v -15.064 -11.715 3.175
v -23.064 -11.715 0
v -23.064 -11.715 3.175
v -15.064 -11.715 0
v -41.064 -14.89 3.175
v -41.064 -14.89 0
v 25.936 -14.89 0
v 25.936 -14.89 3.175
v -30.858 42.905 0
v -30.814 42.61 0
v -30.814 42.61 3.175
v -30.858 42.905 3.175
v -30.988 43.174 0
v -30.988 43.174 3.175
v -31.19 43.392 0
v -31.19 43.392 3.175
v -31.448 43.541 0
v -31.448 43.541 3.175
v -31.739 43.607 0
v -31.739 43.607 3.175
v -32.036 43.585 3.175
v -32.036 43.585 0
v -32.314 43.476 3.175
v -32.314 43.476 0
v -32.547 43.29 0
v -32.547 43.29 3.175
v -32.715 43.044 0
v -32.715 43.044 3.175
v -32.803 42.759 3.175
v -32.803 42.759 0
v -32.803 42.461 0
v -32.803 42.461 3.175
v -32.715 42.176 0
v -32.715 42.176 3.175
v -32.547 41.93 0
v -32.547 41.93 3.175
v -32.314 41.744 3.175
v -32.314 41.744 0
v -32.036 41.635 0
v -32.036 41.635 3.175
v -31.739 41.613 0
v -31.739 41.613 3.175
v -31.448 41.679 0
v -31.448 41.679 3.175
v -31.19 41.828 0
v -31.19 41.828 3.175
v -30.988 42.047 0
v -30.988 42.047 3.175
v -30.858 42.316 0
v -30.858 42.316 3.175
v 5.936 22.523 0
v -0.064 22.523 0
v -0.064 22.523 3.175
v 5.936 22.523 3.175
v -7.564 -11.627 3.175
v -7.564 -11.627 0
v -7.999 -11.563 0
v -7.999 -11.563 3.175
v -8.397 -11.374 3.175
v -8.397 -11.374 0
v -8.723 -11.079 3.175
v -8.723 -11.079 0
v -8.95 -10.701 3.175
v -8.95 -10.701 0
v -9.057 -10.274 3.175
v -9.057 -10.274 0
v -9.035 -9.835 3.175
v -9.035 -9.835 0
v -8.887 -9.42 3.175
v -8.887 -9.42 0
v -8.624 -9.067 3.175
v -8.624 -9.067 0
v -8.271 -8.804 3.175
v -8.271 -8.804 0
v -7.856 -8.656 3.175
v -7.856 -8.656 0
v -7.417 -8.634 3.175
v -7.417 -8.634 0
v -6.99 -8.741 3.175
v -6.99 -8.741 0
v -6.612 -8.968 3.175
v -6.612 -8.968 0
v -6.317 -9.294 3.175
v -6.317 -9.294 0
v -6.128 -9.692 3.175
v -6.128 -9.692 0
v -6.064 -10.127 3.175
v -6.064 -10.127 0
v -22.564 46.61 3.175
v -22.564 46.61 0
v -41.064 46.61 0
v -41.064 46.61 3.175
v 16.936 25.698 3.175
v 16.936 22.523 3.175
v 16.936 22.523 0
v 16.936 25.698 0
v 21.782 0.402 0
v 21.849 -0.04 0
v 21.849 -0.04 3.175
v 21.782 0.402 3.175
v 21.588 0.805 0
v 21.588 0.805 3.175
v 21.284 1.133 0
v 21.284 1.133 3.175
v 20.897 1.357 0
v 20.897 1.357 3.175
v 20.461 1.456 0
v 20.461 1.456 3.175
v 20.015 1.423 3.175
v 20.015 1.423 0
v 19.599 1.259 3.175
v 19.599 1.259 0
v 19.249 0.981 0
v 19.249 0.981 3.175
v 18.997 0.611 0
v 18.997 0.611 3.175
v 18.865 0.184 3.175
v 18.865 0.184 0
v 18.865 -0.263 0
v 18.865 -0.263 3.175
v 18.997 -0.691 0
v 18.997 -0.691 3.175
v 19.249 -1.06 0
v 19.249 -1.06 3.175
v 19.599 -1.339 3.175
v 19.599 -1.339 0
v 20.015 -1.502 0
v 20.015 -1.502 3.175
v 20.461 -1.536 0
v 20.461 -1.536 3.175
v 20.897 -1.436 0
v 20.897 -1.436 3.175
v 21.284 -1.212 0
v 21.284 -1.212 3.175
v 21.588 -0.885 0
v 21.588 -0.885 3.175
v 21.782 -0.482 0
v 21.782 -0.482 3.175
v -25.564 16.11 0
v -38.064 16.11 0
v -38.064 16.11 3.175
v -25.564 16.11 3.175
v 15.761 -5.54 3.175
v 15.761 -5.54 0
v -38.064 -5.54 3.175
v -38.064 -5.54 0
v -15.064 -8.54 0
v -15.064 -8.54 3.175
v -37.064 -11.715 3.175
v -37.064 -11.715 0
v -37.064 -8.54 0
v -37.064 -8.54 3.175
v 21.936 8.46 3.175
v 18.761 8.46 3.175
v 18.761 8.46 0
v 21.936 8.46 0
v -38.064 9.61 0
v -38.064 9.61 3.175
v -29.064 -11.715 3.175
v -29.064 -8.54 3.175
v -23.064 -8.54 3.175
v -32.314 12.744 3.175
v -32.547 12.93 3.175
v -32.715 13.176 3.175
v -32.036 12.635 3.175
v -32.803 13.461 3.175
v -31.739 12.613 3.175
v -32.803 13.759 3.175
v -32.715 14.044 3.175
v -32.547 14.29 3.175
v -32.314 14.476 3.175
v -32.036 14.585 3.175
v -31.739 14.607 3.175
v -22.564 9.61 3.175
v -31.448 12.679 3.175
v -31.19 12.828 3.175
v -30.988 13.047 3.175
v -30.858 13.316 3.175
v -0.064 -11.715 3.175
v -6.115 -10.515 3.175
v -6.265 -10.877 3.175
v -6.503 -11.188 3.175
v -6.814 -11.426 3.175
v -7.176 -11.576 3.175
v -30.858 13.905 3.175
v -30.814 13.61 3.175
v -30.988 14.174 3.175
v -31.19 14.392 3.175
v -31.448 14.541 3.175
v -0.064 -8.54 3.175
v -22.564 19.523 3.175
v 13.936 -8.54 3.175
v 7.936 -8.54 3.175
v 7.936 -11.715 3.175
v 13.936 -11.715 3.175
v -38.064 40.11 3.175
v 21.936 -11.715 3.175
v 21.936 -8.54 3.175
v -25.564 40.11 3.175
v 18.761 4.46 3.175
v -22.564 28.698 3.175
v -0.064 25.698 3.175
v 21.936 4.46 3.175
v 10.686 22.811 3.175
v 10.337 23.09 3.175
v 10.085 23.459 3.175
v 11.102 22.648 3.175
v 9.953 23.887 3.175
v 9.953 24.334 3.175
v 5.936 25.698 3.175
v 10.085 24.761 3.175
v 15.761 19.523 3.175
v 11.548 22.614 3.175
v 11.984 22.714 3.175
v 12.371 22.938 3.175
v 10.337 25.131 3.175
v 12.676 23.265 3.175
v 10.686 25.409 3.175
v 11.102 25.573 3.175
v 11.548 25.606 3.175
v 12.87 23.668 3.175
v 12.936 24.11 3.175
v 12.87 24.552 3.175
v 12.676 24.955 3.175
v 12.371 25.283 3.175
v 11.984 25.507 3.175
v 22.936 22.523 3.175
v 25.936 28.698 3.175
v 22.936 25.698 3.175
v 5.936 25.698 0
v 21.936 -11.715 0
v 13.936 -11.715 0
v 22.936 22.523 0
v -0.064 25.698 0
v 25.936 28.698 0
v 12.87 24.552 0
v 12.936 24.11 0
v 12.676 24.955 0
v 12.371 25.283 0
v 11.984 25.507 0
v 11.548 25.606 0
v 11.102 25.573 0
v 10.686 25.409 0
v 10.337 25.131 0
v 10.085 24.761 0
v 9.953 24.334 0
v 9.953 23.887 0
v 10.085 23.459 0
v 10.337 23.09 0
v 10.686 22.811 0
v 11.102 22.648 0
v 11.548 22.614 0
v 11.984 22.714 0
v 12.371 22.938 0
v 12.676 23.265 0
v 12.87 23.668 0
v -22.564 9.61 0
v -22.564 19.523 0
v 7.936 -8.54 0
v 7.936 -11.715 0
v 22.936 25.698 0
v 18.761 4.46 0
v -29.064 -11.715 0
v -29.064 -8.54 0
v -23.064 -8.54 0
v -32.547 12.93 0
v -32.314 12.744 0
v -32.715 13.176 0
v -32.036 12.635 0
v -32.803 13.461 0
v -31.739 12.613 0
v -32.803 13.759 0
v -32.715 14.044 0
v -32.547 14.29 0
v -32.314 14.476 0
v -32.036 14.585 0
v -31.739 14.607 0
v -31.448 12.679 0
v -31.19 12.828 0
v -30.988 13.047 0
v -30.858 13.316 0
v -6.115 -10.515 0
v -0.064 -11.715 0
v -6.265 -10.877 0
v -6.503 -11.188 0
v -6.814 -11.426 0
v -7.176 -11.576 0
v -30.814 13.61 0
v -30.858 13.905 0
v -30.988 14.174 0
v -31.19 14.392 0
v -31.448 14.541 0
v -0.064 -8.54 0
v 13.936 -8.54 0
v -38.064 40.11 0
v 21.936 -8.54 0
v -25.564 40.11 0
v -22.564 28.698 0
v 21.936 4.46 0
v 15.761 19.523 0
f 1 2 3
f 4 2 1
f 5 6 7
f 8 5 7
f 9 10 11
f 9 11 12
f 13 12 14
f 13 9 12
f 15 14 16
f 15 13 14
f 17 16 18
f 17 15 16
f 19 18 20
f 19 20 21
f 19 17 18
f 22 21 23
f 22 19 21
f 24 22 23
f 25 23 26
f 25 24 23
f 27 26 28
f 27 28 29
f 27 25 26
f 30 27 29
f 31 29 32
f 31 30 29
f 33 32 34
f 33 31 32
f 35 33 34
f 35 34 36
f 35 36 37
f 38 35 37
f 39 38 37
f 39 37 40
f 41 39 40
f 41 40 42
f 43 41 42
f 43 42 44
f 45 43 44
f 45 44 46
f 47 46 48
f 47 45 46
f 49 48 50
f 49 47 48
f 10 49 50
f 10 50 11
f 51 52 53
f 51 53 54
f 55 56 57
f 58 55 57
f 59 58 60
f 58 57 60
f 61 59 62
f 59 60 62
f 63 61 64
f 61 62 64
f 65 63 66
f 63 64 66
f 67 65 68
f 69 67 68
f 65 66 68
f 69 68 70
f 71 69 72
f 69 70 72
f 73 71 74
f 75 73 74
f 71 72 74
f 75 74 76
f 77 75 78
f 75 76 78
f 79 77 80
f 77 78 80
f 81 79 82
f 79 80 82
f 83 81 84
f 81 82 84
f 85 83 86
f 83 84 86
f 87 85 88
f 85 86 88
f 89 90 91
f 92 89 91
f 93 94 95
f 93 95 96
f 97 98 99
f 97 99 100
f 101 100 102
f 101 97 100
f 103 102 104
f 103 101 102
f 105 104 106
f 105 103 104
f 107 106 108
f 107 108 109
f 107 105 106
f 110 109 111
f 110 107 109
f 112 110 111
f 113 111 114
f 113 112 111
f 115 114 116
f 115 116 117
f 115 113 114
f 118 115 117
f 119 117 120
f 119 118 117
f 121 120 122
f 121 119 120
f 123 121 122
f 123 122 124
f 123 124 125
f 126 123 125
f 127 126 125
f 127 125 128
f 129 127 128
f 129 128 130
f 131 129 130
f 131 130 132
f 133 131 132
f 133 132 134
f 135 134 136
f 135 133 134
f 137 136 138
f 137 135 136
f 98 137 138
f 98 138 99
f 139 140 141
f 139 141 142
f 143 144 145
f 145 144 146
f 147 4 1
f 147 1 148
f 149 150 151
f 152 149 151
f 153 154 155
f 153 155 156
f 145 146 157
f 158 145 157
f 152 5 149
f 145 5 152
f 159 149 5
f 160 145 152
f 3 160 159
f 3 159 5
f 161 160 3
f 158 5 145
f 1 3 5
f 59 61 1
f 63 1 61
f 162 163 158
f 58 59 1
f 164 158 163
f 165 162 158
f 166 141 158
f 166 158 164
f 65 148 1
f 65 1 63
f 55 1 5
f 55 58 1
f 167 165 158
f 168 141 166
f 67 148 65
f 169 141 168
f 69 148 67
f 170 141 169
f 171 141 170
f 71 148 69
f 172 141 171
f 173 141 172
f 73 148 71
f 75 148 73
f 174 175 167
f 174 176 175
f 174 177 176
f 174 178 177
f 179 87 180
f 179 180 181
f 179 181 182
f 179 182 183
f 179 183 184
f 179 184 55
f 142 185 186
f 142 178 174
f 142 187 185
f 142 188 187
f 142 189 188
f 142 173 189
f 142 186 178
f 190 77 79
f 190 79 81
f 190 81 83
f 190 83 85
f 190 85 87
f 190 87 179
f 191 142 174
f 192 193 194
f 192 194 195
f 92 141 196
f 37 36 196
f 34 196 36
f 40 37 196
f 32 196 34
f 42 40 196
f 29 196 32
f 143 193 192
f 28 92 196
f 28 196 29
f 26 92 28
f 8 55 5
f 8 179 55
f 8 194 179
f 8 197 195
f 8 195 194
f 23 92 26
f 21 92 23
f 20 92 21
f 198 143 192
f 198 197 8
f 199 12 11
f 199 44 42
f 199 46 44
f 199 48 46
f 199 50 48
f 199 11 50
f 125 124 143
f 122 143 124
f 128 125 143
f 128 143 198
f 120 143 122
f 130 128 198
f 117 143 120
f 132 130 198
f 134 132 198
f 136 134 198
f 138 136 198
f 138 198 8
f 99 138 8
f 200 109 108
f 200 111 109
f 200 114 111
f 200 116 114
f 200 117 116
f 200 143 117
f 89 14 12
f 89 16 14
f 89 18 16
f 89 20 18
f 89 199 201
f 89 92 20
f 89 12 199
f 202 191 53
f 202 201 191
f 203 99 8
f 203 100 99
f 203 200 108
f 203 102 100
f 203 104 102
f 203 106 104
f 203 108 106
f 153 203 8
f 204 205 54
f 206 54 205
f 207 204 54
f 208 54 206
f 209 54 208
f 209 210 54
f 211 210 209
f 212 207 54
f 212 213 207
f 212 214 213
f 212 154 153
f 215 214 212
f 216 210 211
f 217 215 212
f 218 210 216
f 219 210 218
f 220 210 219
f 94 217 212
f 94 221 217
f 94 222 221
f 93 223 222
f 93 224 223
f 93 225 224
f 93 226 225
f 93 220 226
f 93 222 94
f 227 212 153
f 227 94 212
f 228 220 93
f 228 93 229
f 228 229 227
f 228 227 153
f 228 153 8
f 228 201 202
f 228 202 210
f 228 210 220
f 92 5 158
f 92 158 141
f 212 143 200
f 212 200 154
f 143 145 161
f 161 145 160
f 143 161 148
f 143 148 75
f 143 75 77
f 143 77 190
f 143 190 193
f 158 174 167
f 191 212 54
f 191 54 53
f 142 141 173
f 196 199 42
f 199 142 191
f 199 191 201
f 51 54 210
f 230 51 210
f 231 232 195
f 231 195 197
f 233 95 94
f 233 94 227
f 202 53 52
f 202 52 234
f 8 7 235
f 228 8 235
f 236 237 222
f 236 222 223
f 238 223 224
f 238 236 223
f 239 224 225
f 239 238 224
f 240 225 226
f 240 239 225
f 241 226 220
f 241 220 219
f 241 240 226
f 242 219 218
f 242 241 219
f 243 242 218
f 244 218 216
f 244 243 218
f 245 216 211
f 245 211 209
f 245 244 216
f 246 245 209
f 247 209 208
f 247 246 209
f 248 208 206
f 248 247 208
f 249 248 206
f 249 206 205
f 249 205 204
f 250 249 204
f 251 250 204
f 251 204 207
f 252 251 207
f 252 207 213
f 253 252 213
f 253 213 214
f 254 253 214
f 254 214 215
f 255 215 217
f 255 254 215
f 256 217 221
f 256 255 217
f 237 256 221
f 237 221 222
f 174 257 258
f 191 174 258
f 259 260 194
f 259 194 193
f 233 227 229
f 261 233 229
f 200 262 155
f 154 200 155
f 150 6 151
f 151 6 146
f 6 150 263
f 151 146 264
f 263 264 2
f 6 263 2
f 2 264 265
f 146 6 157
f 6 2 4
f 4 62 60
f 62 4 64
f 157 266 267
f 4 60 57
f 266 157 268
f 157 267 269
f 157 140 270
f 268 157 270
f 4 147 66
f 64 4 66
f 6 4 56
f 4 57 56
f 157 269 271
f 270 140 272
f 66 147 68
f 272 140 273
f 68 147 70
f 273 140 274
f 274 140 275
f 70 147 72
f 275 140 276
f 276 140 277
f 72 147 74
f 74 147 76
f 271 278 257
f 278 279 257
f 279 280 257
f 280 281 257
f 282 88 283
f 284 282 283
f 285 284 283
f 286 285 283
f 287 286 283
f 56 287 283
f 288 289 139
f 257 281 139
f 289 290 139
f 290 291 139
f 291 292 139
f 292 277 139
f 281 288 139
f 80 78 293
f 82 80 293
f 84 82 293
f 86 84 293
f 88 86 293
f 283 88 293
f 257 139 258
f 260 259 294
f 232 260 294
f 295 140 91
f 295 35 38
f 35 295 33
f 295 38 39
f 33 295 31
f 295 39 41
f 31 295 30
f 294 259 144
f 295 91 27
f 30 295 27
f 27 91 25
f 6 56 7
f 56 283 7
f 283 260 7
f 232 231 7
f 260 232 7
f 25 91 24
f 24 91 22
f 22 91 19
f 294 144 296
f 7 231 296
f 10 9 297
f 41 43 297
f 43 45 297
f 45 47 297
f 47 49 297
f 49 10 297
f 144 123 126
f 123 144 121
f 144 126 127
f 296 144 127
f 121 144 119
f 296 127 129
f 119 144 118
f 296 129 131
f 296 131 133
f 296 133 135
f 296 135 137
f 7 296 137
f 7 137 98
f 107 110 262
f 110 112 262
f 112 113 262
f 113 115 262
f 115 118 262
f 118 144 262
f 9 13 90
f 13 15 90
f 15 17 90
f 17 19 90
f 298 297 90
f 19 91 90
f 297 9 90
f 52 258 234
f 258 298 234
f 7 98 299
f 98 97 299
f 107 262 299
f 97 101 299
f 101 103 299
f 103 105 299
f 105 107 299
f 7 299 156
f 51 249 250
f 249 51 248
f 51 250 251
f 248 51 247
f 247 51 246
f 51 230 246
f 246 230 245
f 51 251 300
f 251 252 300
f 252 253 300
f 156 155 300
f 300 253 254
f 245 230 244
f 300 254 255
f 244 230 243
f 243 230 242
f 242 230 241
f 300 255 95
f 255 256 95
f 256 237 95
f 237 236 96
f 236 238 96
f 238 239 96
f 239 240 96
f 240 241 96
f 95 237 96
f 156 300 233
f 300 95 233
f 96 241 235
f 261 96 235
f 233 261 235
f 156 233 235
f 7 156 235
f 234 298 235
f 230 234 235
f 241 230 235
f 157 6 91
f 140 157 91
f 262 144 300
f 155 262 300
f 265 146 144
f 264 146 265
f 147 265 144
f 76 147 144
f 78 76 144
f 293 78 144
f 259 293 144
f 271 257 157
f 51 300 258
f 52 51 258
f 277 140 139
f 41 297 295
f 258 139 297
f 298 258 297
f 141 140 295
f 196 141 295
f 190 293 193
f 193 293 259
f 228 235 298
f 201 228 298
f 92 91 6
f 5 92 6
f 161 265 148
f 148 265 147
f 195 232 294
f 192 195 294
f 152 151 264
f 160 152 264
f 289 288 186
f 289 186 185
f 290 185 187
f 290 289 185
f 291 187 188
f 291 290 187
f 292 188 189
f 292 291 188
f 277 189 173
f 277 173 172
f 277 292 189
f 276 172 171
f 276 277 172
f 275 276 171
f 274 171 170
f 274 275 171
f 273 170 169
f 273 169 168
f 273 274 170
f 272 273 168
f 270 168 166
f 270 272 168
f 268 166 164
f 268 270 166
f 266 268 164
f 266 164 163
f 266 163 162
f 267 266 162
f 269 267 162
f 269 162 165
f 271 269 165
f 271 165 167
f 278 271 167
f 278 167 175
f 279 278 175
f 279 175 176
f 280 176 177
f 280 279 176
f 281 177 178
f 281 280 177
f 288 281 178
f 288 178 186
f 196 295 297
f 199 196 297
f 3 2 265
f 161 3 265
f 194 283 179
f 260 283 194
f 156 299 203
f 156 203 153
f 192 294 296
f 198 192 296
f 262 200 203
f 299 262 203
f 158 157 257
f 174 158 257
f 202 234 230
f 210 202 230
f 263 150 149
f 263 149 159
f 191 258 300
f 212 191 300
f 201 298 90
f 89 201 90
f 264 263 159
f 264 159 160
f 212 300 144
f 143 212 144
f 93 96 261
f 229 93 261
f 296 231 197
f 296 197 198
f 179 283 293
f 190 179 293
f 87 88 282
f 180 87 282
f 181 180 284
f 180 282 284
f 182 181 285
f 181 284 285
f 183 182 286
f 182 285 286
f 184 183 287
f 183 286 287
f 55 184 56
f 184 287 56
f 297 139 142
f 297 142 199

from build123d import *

# Parameters (mm, degrees)
F0_W     = 8
F0_H     = 3.175
F0_R     = 1
F0_R_2   = 1.5
F0_W_2   = 3.175
F0_H_2   = 4
F0_W_3   = 12.5
F0_H_3   = 24
F0_W_4   = 6
F1_DEPTH = 3.175


# Not quite as in the source:
# - a length typed as a fraction of an inch, garbled in the dataset ("3 / 203.2 mm" for 3/8 in), is restored


with BuildPart() as f1:
    # F0 (on Top) → F1 (new body)
    with BuildSketch(Plane.XY):
        Polygon((-41.0637862384, -14.8897265702), (-7.5637862384, -14.8897265702), (25.9362137616, -14.8897265702), (25.9362137616, 28.6977734298), (-22.5637862384, 28.6977734298), (-22.5637862384, 46.6102734298), (-41.0637862384, 46.6102734298), align=None)
        with Locations((-33.0637862384, -10.1272265702)):
            Rectangle(F0_W, F0_H, mode=Mode.SUBTRACT)
        with Locations((-19.0637862384, -10.1272265702)):
            Rectangle(F0_W, F0_H, mode=Mode.SUBTRACT)
        with Locations((-31.8137862384, 13.6102734298)):
            Circle(F0_R, mode=Mode.SUBTRACT)
        Polygon((15.7612137616, -5.5397265702), (-38.0637862384, -5.5397265702), (-38.0637862384, 9.6102734298), (-22.5637862384, 9.6102734298), (-22.5637862384, 19.5227734298), (15.7612137616, 19.5227734298), (15.7612137616, 9.6102734298), align=None, mode=Mode.SUBTRACT)
        with BuildLine():
            ThreePointArc((-7.5637862384, -11.6272265702), (-8.6244464102, -9.0665663985), (-6.0637862384, -10.1272265702))
            ThreePointArc((-6.0637862384, -10.1272265702), (-6.5031260667, -11.187886742), (-7.5637862384, -11.6272265702))
        make_face(mode=Mode.SUBTRACT)
        with Locations((3.9362137616, -10.1272265702)):
            Rectangle(F0_W, F0_H, mode=Mode.SUBTRACT)
        with Locations((17.9362137616, -10.1272265702)):
            Rectangle(F0_W, F0_H, mode=Mode.SUBTRACT)
        with Locations((20.3487137616, -0.0397265702)):
            Circle(F0_R_2, mode=Mode.SUBTRACT)
        with Locations((20.3487137616, 6.4602734298)):
            Rectangle(F0_W_2, F0_H_2, mode=Mode.SUBTRACT)
        with Locations((-31.8137862384, 28.1102734298)):
            Rectangle(F0_W_3, F0_H_3, mode=Mode.SUBTRACT)
        with Locations((-31.8137862384, 42.6102734298)):
            Circle(F0_R, mode=Mode.SUBTRACT)
        with Locations((2.9362137616, 24.1102734298)):
            Rectangle(F0_W_4, F0_H, mode=Mode.SUBTRACT)
        with Locations((11.4362137616, 24.1102734298)):
            Circle(F0_R_2, mode=Mode.SUBTRACT)
        with Locations((19.9362137616, 24.1102734298)):
            Rectangle(F0_W_4, F0_H, mode=Mode.SUBTRACT)
    extrude(amount=F1_DEPTH)


solid = f1.part
